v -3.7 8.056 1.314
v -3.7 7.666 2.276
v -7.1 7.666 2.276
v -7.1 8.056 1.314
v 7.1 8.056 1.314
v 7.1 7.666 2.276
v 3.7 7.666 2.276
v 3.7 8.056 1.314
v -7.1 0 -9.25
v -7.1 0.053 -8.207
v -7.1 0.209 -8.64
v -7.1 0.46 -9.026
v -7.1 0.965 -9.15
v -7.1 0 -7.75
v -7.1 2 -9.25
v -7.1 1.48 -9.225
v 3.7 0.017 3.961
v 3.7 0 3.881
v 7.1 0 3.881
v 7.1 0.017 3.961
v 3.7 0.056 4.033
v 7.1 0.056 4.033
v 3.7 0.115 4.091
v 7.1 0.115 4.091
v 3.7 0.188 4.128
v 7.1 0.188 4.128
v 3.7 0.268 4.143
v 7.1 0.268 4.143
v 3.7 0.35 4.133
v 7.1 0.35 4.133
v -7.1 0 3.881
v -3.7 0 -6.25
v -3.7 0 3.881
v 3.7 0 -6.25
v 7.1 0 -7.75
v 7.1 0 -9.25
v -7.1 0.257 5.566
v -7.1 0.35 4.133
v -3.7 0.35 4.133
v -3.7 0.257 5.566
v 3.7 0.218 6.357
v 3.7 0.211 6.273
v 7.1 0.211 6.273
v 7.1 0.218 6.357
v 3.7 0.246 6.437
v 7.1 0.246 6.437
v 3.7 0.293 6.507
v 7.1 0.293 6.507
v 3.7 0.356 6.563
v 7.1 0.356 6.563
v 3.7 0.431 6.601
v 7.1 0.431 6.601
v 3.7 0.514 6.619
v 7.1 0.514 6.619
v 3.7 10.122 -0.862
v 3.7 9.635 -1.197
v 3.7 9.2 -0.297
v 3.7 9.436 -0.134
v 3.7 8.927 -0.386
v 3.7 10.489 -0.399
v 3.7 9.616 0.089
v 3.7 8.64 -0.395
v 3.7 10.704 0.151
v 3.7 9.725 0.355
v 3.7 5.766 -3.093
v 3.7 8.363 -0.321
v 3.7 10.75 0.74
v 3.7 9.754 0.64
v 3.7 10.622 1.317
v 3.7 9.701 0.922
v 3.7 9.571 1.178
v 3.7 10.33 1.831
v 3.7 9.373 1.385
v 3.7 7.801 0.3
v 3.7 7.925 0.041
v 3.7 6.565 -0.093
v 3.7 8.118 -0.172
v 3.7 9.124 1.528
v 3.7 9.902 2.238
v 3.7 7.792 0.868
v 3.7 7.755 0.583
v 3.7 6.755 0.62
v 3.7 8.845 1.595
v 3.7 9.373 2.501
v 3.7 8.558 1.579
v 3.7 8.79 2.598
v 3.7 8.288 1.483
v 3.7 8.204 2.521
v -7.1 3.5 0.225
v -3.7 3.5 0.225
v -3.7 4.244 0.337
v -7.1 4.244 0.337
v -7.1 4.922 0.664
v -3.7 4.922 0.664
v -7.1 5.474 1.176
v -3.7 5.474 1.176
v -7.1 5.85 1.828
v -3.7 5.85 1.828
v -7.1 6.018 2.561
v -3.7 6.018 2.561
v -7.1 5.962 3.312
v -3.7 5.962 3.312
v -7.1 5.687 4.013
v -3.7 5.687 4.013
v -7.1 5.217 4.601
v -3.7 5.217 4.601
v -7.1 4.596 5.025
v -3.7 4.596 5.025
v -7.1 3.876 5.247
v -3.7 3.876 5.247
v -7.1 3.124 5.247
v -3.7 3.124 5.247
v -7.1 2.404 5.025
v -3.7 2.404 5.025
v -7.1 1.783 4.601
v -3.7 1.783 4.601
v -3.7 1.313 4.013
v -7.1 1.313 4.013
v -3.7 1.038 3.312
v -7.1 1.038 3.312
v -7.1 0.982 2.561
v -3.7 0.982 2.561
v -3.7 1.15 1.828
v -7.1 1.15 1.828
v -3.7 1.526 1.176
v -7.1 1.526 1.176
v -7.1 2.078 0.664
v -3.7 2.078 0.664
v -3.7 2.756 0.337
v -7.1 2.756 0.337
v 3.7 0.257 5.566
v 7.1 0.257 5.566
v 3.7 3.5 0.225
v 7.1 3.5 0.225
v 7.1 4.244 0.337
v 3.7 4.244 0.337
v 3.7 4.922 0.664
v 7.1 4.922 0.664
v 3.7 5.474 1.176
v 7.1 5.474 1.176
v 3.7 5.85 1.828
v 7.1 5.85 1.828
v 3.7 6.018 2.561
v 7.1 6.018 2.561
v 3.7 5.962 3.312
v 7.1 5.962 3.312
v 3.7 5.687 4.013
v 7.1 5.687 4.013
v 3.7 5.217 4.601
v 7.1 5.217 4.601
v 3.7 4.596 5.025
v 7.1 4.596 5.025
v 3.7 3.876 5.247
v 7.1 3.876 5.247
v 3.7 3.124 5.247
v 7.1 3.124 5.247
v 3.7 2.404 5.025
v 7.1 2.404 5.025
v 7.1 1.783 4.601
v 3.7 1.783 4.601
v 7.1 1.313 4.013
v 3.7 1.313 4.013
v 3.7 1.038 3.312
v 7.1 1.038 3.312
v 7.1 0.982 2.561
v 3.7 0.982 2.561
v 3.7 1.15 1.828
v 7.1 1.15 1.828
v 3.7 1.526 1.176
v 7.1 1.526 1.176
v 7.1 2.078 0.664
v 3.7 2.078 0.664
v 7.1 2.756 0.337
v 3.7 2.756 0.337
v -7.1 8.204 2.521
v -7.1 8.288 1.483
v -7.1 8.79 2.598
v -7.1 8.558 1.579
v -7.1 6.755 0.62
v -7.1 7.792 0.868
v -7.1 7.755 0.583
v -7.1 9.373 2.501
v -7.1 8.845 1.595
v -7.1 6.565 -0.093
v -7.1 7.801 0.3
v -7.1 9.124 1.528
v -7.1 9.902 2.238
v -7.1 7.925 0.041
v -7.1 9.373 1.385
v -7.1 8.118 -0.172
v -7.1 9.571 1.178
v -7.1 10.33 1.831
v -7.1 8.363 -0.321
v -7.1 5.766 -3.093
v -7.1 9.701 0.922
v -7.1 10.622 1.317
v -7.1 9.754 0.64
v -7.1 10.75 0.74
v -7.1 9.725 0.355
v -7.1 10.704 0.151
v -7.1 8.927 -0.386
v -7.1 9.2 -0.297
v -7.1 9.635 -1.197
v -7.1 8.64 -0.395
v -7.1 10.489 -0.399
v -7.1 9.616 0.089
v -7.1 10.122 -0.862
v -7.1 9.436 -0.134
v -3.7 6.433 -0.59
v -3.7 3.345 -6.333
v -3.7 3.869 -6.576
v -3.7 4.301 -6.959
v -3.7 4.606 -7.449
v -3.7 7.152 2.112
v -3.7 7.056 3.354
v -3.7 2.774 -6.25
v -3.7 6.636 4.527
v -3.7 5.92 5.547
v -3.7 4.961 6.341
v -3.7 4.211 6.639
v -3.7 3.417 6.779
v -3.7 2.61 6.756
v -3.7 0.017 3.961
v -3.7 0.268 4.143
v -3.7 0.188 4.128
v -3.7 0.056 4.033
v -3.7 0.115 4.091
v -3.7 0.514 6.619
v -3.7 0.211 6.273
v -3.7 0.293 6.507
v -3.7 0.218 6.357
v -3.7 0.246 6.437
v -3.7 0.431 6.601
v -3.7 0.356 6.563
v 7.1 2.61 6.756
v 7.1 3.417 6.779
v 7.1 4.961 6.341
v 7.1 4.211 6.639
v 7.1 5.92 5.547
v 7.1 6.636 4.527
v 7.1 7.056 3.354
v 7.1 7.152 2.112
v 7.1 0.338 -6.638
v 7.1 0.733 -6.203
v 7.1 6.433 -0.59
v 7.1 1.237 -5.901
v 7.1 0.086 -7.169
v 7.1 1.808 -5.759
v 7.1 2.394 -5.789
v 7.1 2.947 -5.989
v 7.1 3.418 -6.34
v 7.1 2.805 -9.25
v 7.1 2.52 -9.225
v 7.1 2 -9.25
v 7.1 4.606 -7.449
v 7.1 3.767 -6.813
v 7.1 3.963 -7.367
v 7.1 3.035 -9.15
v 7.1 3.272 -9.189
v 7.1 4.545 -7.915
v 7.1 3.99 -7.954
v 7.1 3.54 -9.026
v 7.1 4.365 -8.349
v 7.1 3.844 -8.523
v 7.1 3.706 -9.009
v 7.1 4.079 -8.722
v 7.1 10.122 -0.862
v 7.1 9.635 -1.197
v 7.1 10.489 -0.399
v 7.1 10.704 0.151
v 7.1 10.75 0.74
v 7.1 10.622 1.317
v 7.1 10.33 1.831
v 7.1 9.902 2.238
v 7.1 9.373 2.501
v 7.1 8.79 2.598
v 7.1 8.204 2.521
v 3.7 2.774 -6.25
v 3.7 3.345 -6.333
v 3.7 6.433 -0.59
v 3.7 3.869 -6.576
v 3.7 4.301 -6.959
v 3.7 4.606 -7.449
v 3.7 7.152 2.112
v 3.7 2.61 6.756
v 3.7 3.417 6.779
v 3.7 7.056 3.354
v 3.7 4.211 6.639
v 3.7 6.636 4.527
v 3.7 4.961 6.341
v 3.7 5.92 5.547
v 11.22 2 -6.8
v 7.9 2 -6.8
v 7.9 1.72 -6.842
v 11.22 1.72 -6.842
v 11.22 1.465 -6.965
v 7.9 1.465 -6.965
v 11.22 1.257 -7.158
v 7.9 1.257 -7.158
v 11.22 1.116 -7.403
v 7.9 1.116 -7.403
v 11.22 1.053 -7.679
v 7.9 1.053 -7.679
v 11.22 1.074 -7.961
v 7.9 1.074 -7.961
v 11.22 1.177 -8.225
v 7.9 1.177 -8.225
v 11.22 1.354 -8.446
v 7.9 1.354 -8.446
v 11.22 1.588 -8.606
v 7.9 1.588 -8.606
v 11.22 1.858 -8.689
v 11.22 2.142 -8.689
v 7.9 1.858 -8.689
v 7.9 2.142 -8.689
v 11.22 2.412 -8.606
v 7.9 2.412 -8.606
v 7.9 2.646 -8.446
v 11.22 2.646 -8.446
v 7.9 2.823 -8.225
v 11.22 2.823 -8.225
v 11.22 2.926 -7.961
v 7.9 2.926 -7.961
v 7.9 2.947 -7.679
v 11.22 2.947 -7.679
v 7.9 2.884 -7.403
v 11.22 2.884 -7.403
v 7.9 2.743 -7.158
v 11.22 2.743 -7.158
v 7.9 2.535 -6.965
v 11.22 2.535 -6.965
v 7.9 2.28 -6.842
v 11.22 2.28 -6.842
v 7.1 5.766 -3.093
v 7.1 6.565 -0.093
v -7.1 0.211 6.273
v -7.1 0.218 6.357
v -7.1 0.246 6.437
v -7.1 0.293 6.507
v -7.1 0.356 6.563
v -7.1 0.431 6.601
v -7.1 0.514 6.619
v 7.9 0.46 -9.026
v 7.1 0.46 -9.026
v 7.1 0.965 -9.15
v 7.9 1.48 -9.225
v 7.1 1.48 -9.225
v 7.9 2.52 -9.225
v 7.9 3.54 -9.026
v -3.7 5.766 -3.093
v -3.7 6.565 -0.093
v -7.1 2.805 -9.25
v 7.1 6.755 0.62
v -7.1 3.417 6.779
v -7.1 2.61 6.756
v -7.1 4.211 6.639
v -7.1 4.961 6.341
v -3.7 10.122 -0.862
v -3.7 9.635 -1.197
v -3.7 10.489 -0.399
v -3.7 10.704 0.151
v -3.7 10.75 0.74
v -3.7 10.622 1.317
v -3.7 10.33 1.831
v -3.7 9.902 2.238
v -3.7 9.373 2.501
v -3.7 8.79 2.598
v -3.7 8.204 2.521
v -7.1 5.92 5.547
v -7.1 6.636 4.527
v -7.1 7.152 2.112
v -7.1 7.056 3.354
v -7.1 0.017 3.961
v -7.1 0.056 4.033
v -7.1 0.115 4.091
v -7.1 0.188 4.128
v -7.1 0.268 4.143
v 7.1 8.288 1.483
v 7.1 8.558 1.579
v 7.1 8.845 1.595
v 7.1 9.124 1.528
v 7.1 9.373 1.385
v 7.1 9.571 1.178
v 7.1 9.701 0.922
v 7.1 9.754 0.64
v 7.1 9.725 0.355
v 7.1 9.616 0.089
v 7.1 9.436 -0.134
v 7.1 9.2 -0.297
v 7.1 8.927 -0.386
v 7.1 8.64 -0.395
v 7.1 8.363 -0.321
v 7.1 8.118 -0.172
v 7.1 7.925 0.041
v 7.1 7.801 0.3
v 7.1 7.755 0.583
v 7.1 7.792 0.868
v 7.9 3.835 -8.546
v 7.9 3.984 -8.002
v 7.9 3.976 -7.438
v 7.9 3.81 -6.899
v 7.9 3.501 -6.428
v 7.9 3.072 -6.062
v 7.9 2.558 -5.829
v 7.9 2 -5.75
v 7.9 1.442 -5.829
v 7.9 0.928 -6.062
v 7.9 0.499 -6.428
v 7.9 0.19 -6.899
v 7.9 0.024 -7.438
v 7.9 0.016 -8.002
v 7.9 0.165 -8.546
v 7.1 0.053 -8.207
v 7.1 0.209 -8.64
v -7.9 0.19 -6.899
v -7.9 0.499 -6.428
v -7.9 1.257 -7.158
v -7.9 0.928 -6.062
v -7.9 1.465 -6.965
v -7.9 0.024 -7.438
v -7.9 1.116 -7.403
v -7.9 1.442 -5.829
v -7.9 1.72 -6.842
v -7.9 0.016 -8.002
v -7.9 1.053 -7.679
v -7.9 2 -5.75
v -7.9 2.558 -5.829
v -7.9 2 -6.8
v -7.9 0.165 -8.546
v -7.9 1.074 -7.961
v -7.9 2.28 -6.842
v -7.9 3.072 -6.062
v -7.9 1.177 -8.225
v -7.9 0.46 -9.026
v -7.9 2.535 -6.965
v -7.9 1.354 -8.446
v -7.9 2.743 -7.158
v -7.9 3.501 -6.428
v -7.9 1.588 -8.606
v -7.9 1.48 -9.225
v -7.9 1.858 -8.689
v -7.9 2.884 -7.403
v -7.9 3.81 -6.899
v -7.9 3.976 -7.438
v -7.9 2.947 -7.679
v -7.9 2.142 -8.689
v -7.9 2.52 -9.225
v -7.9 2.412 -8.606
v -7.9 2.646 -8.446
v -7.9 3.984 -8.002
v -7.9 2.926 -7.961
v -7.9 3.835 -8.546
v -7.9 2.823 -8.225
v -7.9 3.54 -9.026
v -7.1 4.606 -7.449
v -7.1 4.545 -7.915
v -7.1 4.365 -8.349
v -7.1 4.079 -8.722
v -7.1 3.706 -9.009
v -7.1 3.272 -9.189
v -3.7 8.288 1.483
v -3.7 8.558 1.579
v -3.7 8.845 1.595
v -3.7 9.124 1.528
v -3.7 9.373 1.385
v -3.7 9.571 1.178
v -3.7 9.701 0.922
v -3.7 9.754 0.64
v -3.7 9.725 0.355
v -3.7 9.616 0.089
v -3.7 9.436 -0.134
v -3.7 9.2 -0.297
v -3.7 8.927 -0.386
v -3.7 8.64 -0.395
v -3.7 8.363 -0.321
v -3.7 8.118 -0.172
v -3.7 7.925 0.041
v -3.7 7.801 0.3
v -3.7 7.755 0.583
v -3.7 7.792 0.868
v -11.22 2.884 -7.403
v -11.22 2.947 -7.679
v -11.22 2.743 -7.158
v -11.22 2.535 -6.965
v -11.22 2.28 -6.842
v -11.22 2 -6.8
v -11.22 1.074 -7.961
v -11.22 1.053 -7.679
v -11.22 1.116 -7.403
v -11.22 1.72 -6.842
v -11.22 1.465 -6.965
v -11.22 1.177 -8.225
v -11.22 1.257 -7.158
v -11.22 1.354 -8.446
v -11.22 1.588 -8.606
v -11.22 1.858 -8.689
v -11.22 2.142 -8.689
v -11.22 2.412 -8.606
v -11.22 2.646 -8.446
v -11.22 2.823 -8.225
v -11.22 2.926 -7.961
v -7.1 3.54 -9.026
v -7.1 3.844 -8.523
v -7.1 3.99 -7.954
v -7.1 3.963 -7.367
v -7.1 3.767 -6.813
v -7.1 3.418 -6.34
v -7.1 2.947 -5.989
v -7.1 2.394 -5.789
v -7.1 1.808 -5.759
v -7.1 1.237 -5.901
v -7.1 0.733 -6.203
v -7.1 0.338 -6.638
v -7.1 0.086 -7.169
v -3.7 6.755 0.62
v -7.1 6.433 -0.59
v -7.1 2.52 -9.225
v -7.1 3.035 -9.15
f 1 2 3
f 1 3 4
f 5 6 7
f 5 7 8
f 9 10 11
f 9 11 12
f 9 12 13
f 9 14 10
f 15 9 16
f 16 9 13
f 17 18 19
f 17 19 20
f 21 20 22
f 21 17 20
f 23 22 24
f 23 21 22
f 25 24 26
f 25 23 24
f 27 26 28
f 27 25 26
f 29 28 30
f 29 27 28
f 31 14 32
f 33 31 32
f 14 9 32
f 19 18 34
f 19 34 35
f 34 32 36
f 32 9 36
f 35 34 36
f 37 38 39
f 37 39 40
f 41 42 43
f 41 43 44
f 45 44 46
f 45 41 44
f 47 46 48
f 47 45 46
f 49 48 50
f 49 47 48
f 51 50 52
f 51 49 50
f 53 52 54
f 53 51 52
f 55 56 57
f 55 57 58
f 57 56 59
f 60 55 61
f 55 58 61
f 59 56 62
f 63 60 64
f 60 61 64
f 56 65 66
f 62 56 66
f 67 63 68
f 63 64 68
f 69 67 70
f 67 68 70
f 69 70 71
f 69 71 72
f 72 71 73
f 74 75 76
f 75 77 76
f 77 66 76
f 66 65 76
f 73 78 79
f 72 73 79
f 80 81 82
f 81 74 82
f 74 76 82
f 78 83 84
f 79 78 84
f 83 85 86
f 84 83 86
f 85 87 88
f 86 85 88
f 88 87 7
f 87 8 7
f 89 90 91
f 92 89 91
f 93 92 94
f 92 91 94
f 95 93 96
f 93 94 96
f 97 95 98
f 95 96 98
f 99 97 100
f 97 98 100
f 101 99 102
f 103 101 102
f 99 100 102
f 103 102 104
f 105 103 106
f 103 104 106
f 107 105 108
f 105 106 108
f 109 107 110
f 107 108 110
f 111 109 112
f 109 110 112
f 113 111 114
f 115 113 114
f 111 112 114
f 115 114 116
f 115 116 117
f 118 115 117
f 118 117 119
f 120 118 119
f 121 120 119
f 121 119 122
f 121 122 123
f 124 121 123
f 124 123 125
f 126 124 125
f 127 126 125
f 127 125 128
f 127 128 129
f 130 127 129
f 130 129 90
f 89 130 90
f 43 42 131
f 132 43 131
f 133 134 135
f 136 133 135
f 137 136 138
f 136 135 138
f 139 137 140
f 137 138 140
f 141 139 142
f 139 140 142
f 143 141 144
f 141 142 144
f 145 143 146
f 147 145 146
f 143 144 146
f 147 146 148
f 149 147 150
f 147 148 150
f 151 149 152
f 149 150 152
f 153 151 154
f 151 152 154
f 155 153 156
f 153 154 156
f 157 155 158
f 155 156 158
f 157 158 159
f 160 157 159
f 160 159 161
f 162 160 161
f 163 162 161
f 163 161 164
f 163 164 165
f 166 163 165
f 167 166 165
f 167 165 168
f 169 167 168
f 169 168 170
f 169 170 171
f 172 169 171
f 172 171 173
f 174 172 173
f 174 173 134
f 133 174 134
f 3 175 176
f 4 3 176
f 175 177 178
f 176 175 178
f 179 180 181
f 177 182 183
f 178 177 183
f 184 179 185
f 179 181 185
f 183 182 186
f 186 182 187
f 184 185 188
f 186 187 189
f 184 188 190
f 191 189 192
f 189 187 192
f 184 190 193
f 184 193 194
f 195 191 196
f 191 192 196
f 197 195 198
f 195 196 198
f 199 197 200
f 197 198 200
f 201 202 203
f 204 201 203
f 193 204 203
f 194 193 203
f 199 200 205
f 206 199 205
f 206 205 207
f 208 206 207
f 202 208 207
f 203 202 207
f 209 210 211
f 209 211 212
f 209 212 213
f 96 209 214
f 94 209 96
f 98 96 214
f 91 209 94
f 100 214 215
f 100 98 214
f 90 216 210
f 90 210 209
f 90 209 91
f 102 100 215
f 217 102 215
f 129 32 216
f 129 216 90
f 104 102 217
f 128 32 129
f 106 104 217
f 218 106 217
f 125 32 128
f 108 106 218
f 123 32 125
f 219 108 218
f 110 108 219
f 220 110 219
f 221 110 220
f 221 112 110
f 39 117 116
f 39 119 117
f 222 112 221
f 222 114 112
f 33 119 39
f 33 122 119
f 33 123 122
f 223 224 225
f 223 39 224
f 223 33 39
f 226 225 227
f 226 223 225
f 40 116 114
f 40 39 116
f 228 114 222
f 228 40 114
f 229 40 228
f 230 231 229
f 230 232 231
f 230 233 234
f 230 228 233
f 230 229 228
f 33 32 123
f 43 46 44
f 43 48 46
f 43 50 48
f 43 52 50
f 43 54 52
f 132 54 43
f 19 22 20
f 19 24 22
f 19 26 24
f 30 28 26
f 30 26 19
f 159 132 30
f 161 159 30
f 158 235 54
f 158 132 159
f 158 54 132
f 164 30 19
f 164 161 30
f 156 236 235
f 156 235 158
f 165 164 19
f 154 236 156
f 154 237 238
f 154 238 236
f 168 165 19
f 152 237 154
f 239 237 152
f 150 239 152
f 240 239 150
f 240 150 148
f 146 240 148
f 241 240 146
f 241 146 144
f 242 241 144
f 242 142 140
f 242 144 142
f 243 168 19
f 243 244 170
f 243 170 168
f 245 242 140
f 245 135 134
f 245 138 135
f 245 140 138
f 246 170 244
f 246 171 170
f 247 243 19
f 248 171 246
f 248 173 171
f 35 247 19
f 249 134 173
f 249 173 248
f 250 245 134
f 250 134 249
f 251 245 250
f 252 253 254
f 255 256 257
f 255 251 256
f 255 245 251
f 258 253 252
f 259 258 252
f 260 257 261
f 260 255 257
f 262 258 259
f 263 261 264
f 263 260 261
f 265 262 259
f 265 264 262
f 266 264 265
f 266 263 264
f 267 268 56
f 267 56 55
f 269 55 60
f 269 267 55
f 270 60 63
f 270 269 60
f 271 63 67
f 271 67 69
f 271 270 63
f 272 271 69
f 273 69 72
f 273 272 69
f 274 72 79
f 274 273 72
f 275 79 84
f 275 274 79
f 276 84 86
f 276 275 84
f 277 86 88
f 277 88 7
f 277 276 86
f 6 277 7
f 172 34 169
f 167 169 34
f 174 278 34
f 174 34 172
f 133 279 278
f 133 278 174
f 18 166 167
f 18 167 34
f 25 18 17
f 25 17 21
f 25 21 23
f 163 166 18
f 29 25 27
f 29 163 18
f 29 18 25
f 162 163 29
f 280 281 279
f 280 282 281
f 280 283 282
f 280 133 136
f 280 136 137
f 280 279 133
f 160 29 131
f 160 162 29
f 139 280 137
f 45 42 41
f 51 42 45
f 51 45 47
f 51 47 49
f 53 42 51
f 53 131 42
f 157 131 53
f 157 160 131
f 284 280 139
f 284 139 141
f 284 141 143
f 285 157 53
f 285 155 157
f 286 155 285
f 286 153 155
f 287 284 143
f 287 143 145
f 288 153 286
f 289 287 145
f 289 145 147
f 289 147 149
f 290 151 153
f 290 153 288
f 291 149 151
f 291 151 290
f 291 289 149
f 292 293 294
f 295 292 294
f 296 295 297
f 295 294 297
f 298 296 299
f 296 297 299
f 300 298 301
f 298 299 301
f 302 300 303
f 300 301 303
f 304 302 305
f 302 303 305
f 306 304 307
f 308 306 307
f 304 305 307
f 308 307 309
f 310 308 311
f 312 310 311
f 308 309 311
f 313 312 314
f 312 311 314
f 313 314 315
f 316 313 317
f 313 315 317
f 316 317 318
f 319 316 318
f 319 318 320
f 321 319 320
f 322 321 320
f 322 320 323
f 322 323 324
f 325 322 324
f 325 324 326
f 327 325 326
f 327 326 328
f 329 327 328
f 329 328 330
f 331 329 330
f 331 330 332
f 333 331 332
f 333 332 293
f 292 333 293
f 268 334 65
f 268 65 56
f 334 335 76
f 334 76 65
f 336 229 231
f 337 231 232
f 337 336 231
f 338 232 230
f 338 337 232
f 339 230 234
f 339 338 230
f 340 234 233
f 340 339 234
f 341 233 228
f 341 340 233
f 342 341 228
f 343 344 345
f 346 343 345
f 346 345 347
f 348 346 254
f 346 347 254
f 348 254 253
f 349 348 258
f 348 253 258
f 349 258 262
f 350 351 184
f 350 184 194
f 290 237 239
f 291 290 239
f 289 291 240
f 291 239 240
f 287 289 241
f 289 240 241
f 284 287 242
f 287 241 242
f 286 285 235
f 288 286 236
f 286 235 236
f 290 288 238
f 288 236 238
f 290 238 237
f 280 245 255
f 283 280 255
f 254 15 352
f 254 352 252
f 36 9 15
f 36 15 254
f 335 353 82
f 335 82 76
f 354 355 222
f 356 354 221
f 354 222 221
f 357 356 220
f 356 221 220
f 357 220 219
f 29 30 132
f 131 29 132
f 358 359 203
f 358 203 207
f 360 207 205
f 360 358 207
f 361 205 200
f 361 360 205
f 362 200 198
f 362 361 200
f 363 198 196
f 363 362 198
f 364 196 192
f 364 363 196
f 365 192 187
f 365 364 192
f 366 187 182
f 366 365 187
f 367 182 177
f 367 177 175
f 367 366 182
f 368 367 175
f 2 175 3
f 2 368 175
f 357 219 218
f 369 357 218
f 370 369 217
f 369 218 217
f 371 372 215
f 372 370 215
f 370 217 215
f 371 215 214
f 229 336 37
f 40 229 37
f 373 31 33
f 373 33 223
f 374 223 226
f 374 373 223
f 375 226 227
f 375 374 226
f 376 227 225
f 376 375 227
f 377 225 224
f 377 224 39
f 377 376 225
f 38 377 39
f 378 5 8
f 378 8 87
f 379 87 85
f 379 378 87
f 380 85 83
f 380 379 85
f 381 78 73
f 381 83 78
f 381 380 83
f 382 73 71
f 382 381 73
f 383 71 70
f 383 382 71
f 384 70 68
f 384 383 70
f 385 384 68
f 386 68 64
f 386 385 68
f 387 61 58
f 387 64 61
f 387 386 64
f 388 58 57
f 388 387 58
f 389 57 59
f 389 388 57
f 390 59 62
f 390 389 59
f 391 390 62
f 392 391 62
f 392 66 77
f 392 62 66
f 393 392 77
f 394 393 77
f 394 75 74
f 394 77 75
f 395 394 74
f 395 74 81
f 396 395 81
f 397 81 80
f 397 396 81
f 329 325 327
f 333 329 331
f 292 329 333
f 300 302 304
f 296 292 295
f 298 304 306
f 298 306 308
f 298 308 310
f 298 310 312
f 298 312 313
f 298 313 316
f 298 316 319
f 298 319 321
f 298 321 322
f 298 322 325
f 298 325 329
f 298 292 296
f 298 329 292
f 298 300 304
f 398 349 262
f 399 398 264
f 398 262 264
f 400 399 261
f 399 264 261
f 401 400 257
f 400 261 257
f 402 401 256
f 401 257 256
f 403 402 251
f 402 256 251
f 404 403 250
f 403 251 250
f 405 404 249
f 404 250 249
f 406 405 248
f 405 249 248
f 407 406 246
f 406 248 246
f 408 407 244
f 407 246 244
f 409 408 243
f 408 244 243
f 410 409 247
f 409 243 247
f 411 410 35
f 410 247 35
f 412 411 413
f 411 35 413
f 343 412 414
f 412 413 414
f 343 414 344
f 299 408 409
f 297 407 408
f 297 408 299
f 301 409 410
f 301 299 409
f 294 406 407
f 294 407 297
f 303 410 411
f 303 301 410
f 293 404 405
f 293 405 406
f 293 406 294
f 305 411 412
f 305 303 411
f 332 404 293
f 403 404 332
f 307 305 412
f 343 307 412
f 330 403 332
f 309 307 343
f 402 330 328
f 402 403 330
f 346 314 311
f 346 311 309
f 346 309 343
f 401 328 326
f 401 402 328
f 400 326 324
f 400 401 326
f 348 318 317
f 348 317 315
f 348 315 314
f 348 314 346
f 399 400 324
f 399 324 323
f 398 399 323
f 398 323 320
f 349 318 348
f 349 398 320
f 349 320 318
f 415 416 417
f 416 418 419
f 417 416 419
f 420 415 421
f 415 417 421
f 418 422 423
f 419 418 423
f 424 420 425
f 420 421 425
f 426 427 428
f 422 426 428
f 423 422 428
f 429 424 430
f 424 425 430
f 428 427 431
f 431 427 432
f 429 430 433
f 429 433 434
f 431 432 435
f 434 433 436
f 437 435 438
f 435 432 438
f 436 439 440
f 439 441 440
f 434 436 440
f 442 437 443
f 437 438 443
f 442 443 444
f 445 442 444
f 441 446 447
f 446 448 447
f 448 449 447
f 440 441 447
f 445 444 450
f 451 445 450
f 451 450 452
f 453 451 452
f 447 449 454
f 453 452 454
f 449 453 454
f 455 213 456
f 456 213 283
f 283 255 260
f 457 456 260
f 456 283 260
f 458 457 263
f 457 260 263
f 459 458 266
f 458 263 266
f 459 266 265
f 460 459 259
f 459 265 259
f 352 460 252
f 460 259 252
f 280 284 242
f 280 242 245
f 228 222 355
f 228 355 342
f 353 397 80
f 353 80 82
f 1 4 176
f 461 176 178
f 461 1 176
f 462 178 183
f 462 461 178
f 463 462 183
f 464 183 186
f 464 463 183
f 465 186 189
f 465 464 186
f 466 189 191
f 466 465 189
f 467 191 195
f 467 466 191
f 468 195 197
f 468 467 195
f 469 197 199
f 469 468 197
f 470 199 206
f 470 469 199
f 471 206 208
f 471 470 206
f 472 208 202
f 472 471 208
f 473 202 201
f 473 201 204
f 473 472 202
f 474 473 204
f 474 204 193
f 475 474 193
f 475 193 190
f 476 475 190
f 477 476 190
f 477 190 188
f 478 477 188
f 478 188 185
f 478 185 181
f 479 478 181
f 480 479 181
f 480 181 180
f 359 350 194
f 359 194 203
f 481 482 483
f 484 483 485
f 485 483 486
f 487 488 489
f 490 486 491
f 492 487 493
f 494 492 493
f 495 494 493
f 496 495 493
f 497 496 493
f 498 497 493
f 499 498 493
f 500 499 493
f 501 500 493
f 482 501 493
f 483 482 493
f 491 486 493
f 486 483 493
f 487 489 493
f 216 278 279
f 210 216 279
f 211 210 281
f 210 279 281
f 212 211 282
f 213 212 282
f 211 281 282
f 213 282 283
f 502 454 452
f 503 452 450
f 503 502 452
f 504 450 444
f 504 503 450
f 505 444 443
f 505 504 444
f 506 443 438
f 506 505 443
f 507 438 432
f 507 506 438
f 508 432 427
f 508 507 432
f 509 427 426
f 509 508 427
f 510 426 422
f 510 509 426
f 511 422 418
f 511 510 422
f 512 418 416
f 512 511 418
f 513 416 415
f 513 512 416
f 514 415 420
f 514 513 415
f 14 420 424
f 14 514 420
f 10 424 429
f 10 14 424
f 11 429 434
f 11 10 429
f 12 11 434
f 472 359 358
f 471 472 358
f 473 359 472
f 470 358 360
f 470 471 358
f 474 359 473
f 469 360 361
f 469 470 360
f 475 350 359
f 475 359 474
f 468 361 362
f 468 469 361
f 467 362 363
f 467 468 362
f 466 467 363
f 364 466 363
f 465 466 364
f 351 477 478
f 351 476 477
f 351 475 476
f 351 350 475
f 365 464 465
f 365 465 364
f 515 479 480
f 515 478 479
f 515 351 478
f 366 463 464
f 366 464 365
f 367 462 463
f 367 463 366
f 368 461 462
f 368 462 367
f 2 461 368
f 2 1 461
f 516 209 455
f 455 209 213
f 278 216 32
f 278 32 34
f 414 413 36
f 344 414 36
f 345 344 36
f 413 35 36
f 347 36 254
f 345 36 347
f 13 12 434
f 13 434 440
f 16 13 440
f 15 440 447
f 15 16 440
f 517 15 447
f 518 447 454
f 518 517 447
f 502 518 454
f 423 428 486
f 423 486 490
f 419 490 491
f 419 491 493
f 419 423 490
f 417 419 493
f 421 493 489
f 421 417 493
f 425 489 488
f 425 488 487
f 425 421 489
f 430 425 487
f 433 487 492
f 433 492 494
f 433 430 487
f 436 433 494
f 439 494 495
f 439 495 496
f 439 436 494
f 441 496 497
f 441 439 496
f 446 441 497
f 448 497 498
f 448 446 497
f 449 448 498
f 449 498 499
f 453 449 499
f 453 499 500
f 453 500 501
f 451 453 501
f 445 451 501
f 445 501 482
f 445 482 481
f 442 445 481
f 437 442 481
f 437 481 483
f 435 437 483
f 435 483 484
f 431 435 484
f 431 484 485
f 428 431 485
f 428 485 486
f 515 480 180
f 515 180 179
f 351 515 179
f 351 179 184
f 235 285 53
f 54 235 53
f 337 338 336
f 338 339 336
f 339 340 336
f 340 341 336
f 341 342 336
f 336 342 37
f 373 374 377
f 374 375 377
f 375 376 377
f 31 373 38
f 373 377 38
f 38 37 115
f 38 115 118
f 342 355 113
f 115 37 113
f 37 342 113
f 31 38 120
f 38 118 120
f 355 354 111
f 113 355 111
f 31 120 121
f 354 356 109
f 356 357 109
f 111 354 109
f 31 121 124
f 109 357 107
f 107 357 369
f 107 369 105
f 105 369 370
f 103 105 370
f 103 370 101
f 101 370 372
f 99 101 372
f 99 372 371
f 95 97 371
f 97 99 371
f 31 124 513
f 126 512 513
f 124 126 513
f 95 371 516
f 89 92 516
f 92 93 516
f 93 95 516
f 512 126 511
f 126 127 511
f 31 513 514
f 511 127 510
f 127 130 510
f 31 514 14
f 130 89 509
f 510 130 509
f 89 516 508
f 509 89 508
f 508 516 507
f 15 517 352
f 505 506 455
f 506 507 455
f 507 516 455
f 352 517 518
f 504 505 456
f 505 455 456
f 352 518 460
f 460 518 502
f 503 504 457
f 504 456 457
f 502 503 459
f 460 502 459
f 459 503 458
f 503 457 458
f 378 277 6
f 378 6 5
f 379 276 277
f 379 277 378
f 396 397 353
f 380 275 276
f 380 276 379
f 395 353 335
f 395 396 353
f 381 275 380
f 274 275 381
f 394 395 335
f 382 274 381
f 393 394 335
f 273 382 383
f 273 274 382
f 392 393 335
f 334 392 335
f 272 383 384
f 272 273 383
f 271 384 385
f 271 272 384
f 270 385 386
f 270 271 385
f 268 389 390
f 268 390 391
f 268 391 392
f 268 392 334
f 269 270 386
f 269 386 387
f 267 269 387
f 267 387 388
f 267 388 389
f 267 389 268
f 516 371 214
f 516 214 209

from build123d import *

# Parameters (mm, degrees)
SKETCH_3_W               = 14.2
SKETCH_3_H               = 18.5
EXTRUDE_1_DEPTH          = 10
SKETCH_5_R               = 2.525
CUT_EXTRUDE_3_DEPTH      = 20.677461727
SKETCH_5_6_R             = 0.95
EXTRUDE_2_DEPTH          = 4.12
EXTRUDE_3_DEPTH          = 14.2
CUT_EXTRUDE_6_DEPTH      = 19.086568265
CUT_EXTRUDE_6_DEPTH_BACK = 19.086568265
SKETCH_14_W              = 7.4
SKETCH_14_H              = 15.203667289
EXTRUDE_4_DEPTH          = 0.8
FILLET_1_R               = 2
CUT_EXTRUDE_16_DEPTH     = 24.17019533
SKETCH_31_W              = 7.4
SKETCH_31_H              = 10.622526497
CUT_EXTRUDE_17_DEPTH     = 16.468325908
CUT_EXTRUDE_19_DEPTH     = 24.17019533
EXTRUDE_7_DEPTH          = 14.2
SKETCH_36_W              = 7.4
SKETCH_36_H              = 2.688606207
CUT_EXTRUDE_20_DEPTH     = 18.747756854
CUT_EXTRUDE_21_DEPTH     = 24.17019533


with BuildPart() as part:
    # 草图3 → 凸台-拉伸1 (new body)
    with BuildSketch(Plane(origin=(0, 0, 0), x_dir=(1, 0, 0), z_dir=(0, 1, 0))):
        Rectangle(SKETCH_3_W, SKETCH_3_H)
    extrude(amount=EXTRUDE_1_DEPTH)

    # 草图5 → 切除-拉伸3 (cut, through all)
    with BuildSketch(Plane(origin=(7.1, 0, 0), x_dir=(0, 0, -1), z_dir=(1, 0, 0))):
        with BuildLine():
            Line((-9.25, 10), (-9.25, 0))
            Line((-9.25, 0), (-6.336598232, 0))
            ThreePointArc((-6.336598232, 0), (-6.401285502, 4.862104509), (-2.111941752, 7.152470177))
            Line((-2.111941752, 7.152470177), (0.590375146, 6.432854109))
            Line((0.590375146, 6.432854109), (7.448964751, 4.606439417))
            ThreePointArc((7.448964751, 4.606439417), (8.722488989, 4.078928406), (9.25, 2.805404168))
            Line((9.25, 2.805404168), (9.25, 10))
            Line((9.25, 10), (-9.25, 10))
        make_face()
        with Locations((-2.75, 3.5)):
            Circle(SKETCH_5_R)
    extrude(amount=-CUT_EXTRUDE_3_DEPTH, mode=Mode.SUBTRACT)

    # 草图5<6> → 凸台-拉伸2 (add)
    with BuildSketch(Plane(origin=(7.1, 0, 0), x_dir=(0, 0, -1), z_dir=(1, 0, 0))):
        with Locations(Location((7.75, 2, 0), (0, 0, 180))):
            Circle(SKETCH_5_6_R)
    extrude_2 = extrude(amount=EXTRUDE_2_DEPTH)

    # 镜向1: 凸台-拉伸2 across plane
    add(extrude_2.mirror(Plane(origin=(0, 0, 0), x_dir=(0, 0, 1), z_dir=(1, 0, 0))))

    # 草图14 → 切除-拉伸6 (cut, two sides: drawn at the far end of the back side and taken through both)
    with BuildSketch(Plane.XZ.offset(-CUT_EXTRUDE_6_DEPTH_BACK)):
        with Locations((0, 1.351833645)):
            Rectangle(SKETCH_14_W, SKETCH_14_H)
    extrude(amount=CUT_EXTRUDE_6_DEPTH + CUT_EXTRUDE_6_DEPTH_BACK, mode=Mode.SUBTRACT)

    # 草图20 → 凸台-拉伸4 (add)
    with BuildSketch(Plane(origin=(7.1, 0, 0), x_dir=(0, 0, -1), z_dir=(1, 0, 0))):
        with BuildLine():
            ThreePointArc((9.02614068, 3.539956157), (5.75, 2), (9.02614068, 0.460043843))
            ThreePointArc((9.02614068, 0.460043843), (9.25, 2), (9.02614068, 3.539956157))
        make_face()
    extrude_4 = extrude(amount=EXTRUDE_4_DEPTH)

    # 镜向2: 凸台-拉伸4 across plane
    add(extrude_4.mirror(Plane(origin=(0, 0, 0), x_dir=(0, 0, 1), z_dir=(1, 0, 0))))

    # 圆角1
    # the kernel refuses this fillet: 2 mm, written as the material it takes off along each edge
    with BuildSketch(Plane(origin=(3.7, 4.925718884, -6.25), x_dir=(0, -1, 0), z_dir=(-1, 0, 0))) as fillet_1_piece_1:
        with BuildLine():
            CenterArc((2.151857578, -2), FILLET_1_R, 90, 66.389458329)
            Line((0.319279467, -1.198964751), (0.282627905, -1.182944046))
            ThreePointArc((0.282627905, -1.182944046), (0.120986771, -0.609775503), (-0.038652963, -0.010293128))
            Line((-0.038652963, -0.010293128), (0, 0.04))
            Line((0, 0.04), (2.151857578, 0.04))
            Line((2.151857578, 0.04), (2.151857578, 0))
        make_face()
    extrude(amount=7.4, mode=Mode.SUBTRACT)

    # 草图28 → 切除-拉伸16 (cut, through all)
    with BuildSketch(Plane.ZY.offset(7.1)):
        with BuildLine():
            Line((4.133334805, 0.35), (6.998120333, 0.163293632))
            Line((6.998120333, 0.163293632), (6.998120333, 0))
            Line((6.998120333, 0), (3.880750582, 0))
            ThreePointArc((3.880750582, 0), (4.090700414, 0.114626799), (4.133334805, 0.35))
        make_face()
    extrude(amount=-CUT_EXTRUDE_16_DEPTH, mode=Mode.SUBTRACT)

    # 草图33 → 切除-拉伸19 (cut, through all)
    with BuildSketch(Plane(origin=(7.1, 0, 0), x_dir=(0, 0, -1), z_dir=(1, 0, 0))):
        with BuildLine():
            Line((-6.341301644, 4.960852087), (-7.680928531, 4.960852087))
            Line((-7.680928531, 4.960852087), (-7.680928531, 0))
            Line((-7.680928531, 0), (-5.565727569, 0.256646816))
            ThreePointArc((-5.565727569, 0.256646816), (-6.736351761, 2.479684462), (-6.341301644, 4.960852087))
        make_face()
    extrude(amount=-CUT_EXTRUDE_19_DEPTH, mode=Mode.SUBTRACT)

    # 草图35 → 凸台-拉伸7 (add)
    with BuildSketch(Plane.ZY.offset(7.1)):
        Polygon((6.59789795, 0.189377283), (5.565727569, 0.256646816), (6.789337446, 3.126786976), align=None)
    extrude(amount=-EXTRUDE_7_DEPTH)

    # 草图36 → 切除-拉伸20 (cut, through all)
    with BuildSketch(Plane(origin=(0, 0.616761699, 0.040196146), x_dir=(1, 0, 0), z_dir=(0, -0.9978829884707797, -0.06503492385346464))):
        with Locations((0, 6.881556957)):
            Rectangle(SKETCH_36_W, SKETCH_36_H)
    extrude(amount=-CUT_EXTRUDE_20_DEPTH, mode=Mode.SUBTRACT)

    # 草图38 → 切除-拉伸21 (cut, through all)
    with BuildSketch(Plane.ZY.offset(7.1)):
        with BuildLine():
            Line((6.59789795, 0.189377283), (6.273324357, 0.210530684))
            ThreePointArc((6.273324357, 0.210530684), (6.512512605, 0.297710559), (6.619998756, 0.528487672))
            Line((6.619998756, 0.528487672), (6.679795922, 0.184039755))
            Line((6.679795922, 0.184039755), (6.59789795, 0.189377283))
        make_face()
    extrude(amount=-CUT_EXTRUDE_21_DEPTH, mode=Mode.SUBTRACT)


with BuildPart() as body_2:
    # 草图17 → 凸台-拉伸3 (new body)
    with BuildSketch(Plane(origin=(7.1, 0, 0), x_dir=(0, 0, -1), z_dir=(1, 0, 0))):
        with BuildLine():
            Line((-0.62032107, 6.755257618), (0.092613665, 6.565405979))
            Line((0.092613665, 6.565405979), (3.093411655, 5.766305603))
            Line((3.093411655, 5.766305603), (1.197214038, 9.635314631))
            ThreePointArc((1.197214038, 9.635314631), (-1.584907581, 10.495079575), (-2.276410042, 7.666436649))
            Line((-2.276410042, 7.666436649), (-1.313655995, 8.055975059))
            ThreePointArc((-1.313655995, 8.055975059), (-0.08936271, 9.615709888), (-0.867599297, 7.791973449))
            Line((-0.867599297, 7.791973449), (-0.62032107, 6.755257618))
        make_face()
    extrude(amount=-EXTRUDE_3_DEPTH)

    # 草图31 → 切除-拉伸17 (cut, through all)
    with BuildSketch(Plane(origin=(0, 6.153688784, -1.638702452), x_dir=(1, 0, 0), z_dir=(0, -0.9663240662123234, 0.2573281932841431))):
        with Locations((0, 3.805858122)):
            Rectangle(SKETCH_31_W, SKETCH_31_H)
    extrude(amount=-CUT_EXTRUDE_17_DEPTH, mode=Mode.SUBTRACT)


with BuildPart() as cut_extrude_17_piece_1:
    # of the separate pieces the step leaves, piece 1, a body of its own (cut_extrude_17_pieces)
    add(body_2.part.solids().sort_by_distance((7.1, 7.666436649, 2.276410042))[0])


with BuildPart() as cut_extrude_17_piece_2:
    # of the separate pieces the step leaves, piece 2, a body of its own (cut_extrude_17_pieces)
    add(body_2.part.solids().sort_by_distance((-3.7, 7.666436649, 2.276410042))[0])


solid = Compound([part.part, cut_extrude_17_piece_1.part, cut_extrude_17_piece_2.part])
